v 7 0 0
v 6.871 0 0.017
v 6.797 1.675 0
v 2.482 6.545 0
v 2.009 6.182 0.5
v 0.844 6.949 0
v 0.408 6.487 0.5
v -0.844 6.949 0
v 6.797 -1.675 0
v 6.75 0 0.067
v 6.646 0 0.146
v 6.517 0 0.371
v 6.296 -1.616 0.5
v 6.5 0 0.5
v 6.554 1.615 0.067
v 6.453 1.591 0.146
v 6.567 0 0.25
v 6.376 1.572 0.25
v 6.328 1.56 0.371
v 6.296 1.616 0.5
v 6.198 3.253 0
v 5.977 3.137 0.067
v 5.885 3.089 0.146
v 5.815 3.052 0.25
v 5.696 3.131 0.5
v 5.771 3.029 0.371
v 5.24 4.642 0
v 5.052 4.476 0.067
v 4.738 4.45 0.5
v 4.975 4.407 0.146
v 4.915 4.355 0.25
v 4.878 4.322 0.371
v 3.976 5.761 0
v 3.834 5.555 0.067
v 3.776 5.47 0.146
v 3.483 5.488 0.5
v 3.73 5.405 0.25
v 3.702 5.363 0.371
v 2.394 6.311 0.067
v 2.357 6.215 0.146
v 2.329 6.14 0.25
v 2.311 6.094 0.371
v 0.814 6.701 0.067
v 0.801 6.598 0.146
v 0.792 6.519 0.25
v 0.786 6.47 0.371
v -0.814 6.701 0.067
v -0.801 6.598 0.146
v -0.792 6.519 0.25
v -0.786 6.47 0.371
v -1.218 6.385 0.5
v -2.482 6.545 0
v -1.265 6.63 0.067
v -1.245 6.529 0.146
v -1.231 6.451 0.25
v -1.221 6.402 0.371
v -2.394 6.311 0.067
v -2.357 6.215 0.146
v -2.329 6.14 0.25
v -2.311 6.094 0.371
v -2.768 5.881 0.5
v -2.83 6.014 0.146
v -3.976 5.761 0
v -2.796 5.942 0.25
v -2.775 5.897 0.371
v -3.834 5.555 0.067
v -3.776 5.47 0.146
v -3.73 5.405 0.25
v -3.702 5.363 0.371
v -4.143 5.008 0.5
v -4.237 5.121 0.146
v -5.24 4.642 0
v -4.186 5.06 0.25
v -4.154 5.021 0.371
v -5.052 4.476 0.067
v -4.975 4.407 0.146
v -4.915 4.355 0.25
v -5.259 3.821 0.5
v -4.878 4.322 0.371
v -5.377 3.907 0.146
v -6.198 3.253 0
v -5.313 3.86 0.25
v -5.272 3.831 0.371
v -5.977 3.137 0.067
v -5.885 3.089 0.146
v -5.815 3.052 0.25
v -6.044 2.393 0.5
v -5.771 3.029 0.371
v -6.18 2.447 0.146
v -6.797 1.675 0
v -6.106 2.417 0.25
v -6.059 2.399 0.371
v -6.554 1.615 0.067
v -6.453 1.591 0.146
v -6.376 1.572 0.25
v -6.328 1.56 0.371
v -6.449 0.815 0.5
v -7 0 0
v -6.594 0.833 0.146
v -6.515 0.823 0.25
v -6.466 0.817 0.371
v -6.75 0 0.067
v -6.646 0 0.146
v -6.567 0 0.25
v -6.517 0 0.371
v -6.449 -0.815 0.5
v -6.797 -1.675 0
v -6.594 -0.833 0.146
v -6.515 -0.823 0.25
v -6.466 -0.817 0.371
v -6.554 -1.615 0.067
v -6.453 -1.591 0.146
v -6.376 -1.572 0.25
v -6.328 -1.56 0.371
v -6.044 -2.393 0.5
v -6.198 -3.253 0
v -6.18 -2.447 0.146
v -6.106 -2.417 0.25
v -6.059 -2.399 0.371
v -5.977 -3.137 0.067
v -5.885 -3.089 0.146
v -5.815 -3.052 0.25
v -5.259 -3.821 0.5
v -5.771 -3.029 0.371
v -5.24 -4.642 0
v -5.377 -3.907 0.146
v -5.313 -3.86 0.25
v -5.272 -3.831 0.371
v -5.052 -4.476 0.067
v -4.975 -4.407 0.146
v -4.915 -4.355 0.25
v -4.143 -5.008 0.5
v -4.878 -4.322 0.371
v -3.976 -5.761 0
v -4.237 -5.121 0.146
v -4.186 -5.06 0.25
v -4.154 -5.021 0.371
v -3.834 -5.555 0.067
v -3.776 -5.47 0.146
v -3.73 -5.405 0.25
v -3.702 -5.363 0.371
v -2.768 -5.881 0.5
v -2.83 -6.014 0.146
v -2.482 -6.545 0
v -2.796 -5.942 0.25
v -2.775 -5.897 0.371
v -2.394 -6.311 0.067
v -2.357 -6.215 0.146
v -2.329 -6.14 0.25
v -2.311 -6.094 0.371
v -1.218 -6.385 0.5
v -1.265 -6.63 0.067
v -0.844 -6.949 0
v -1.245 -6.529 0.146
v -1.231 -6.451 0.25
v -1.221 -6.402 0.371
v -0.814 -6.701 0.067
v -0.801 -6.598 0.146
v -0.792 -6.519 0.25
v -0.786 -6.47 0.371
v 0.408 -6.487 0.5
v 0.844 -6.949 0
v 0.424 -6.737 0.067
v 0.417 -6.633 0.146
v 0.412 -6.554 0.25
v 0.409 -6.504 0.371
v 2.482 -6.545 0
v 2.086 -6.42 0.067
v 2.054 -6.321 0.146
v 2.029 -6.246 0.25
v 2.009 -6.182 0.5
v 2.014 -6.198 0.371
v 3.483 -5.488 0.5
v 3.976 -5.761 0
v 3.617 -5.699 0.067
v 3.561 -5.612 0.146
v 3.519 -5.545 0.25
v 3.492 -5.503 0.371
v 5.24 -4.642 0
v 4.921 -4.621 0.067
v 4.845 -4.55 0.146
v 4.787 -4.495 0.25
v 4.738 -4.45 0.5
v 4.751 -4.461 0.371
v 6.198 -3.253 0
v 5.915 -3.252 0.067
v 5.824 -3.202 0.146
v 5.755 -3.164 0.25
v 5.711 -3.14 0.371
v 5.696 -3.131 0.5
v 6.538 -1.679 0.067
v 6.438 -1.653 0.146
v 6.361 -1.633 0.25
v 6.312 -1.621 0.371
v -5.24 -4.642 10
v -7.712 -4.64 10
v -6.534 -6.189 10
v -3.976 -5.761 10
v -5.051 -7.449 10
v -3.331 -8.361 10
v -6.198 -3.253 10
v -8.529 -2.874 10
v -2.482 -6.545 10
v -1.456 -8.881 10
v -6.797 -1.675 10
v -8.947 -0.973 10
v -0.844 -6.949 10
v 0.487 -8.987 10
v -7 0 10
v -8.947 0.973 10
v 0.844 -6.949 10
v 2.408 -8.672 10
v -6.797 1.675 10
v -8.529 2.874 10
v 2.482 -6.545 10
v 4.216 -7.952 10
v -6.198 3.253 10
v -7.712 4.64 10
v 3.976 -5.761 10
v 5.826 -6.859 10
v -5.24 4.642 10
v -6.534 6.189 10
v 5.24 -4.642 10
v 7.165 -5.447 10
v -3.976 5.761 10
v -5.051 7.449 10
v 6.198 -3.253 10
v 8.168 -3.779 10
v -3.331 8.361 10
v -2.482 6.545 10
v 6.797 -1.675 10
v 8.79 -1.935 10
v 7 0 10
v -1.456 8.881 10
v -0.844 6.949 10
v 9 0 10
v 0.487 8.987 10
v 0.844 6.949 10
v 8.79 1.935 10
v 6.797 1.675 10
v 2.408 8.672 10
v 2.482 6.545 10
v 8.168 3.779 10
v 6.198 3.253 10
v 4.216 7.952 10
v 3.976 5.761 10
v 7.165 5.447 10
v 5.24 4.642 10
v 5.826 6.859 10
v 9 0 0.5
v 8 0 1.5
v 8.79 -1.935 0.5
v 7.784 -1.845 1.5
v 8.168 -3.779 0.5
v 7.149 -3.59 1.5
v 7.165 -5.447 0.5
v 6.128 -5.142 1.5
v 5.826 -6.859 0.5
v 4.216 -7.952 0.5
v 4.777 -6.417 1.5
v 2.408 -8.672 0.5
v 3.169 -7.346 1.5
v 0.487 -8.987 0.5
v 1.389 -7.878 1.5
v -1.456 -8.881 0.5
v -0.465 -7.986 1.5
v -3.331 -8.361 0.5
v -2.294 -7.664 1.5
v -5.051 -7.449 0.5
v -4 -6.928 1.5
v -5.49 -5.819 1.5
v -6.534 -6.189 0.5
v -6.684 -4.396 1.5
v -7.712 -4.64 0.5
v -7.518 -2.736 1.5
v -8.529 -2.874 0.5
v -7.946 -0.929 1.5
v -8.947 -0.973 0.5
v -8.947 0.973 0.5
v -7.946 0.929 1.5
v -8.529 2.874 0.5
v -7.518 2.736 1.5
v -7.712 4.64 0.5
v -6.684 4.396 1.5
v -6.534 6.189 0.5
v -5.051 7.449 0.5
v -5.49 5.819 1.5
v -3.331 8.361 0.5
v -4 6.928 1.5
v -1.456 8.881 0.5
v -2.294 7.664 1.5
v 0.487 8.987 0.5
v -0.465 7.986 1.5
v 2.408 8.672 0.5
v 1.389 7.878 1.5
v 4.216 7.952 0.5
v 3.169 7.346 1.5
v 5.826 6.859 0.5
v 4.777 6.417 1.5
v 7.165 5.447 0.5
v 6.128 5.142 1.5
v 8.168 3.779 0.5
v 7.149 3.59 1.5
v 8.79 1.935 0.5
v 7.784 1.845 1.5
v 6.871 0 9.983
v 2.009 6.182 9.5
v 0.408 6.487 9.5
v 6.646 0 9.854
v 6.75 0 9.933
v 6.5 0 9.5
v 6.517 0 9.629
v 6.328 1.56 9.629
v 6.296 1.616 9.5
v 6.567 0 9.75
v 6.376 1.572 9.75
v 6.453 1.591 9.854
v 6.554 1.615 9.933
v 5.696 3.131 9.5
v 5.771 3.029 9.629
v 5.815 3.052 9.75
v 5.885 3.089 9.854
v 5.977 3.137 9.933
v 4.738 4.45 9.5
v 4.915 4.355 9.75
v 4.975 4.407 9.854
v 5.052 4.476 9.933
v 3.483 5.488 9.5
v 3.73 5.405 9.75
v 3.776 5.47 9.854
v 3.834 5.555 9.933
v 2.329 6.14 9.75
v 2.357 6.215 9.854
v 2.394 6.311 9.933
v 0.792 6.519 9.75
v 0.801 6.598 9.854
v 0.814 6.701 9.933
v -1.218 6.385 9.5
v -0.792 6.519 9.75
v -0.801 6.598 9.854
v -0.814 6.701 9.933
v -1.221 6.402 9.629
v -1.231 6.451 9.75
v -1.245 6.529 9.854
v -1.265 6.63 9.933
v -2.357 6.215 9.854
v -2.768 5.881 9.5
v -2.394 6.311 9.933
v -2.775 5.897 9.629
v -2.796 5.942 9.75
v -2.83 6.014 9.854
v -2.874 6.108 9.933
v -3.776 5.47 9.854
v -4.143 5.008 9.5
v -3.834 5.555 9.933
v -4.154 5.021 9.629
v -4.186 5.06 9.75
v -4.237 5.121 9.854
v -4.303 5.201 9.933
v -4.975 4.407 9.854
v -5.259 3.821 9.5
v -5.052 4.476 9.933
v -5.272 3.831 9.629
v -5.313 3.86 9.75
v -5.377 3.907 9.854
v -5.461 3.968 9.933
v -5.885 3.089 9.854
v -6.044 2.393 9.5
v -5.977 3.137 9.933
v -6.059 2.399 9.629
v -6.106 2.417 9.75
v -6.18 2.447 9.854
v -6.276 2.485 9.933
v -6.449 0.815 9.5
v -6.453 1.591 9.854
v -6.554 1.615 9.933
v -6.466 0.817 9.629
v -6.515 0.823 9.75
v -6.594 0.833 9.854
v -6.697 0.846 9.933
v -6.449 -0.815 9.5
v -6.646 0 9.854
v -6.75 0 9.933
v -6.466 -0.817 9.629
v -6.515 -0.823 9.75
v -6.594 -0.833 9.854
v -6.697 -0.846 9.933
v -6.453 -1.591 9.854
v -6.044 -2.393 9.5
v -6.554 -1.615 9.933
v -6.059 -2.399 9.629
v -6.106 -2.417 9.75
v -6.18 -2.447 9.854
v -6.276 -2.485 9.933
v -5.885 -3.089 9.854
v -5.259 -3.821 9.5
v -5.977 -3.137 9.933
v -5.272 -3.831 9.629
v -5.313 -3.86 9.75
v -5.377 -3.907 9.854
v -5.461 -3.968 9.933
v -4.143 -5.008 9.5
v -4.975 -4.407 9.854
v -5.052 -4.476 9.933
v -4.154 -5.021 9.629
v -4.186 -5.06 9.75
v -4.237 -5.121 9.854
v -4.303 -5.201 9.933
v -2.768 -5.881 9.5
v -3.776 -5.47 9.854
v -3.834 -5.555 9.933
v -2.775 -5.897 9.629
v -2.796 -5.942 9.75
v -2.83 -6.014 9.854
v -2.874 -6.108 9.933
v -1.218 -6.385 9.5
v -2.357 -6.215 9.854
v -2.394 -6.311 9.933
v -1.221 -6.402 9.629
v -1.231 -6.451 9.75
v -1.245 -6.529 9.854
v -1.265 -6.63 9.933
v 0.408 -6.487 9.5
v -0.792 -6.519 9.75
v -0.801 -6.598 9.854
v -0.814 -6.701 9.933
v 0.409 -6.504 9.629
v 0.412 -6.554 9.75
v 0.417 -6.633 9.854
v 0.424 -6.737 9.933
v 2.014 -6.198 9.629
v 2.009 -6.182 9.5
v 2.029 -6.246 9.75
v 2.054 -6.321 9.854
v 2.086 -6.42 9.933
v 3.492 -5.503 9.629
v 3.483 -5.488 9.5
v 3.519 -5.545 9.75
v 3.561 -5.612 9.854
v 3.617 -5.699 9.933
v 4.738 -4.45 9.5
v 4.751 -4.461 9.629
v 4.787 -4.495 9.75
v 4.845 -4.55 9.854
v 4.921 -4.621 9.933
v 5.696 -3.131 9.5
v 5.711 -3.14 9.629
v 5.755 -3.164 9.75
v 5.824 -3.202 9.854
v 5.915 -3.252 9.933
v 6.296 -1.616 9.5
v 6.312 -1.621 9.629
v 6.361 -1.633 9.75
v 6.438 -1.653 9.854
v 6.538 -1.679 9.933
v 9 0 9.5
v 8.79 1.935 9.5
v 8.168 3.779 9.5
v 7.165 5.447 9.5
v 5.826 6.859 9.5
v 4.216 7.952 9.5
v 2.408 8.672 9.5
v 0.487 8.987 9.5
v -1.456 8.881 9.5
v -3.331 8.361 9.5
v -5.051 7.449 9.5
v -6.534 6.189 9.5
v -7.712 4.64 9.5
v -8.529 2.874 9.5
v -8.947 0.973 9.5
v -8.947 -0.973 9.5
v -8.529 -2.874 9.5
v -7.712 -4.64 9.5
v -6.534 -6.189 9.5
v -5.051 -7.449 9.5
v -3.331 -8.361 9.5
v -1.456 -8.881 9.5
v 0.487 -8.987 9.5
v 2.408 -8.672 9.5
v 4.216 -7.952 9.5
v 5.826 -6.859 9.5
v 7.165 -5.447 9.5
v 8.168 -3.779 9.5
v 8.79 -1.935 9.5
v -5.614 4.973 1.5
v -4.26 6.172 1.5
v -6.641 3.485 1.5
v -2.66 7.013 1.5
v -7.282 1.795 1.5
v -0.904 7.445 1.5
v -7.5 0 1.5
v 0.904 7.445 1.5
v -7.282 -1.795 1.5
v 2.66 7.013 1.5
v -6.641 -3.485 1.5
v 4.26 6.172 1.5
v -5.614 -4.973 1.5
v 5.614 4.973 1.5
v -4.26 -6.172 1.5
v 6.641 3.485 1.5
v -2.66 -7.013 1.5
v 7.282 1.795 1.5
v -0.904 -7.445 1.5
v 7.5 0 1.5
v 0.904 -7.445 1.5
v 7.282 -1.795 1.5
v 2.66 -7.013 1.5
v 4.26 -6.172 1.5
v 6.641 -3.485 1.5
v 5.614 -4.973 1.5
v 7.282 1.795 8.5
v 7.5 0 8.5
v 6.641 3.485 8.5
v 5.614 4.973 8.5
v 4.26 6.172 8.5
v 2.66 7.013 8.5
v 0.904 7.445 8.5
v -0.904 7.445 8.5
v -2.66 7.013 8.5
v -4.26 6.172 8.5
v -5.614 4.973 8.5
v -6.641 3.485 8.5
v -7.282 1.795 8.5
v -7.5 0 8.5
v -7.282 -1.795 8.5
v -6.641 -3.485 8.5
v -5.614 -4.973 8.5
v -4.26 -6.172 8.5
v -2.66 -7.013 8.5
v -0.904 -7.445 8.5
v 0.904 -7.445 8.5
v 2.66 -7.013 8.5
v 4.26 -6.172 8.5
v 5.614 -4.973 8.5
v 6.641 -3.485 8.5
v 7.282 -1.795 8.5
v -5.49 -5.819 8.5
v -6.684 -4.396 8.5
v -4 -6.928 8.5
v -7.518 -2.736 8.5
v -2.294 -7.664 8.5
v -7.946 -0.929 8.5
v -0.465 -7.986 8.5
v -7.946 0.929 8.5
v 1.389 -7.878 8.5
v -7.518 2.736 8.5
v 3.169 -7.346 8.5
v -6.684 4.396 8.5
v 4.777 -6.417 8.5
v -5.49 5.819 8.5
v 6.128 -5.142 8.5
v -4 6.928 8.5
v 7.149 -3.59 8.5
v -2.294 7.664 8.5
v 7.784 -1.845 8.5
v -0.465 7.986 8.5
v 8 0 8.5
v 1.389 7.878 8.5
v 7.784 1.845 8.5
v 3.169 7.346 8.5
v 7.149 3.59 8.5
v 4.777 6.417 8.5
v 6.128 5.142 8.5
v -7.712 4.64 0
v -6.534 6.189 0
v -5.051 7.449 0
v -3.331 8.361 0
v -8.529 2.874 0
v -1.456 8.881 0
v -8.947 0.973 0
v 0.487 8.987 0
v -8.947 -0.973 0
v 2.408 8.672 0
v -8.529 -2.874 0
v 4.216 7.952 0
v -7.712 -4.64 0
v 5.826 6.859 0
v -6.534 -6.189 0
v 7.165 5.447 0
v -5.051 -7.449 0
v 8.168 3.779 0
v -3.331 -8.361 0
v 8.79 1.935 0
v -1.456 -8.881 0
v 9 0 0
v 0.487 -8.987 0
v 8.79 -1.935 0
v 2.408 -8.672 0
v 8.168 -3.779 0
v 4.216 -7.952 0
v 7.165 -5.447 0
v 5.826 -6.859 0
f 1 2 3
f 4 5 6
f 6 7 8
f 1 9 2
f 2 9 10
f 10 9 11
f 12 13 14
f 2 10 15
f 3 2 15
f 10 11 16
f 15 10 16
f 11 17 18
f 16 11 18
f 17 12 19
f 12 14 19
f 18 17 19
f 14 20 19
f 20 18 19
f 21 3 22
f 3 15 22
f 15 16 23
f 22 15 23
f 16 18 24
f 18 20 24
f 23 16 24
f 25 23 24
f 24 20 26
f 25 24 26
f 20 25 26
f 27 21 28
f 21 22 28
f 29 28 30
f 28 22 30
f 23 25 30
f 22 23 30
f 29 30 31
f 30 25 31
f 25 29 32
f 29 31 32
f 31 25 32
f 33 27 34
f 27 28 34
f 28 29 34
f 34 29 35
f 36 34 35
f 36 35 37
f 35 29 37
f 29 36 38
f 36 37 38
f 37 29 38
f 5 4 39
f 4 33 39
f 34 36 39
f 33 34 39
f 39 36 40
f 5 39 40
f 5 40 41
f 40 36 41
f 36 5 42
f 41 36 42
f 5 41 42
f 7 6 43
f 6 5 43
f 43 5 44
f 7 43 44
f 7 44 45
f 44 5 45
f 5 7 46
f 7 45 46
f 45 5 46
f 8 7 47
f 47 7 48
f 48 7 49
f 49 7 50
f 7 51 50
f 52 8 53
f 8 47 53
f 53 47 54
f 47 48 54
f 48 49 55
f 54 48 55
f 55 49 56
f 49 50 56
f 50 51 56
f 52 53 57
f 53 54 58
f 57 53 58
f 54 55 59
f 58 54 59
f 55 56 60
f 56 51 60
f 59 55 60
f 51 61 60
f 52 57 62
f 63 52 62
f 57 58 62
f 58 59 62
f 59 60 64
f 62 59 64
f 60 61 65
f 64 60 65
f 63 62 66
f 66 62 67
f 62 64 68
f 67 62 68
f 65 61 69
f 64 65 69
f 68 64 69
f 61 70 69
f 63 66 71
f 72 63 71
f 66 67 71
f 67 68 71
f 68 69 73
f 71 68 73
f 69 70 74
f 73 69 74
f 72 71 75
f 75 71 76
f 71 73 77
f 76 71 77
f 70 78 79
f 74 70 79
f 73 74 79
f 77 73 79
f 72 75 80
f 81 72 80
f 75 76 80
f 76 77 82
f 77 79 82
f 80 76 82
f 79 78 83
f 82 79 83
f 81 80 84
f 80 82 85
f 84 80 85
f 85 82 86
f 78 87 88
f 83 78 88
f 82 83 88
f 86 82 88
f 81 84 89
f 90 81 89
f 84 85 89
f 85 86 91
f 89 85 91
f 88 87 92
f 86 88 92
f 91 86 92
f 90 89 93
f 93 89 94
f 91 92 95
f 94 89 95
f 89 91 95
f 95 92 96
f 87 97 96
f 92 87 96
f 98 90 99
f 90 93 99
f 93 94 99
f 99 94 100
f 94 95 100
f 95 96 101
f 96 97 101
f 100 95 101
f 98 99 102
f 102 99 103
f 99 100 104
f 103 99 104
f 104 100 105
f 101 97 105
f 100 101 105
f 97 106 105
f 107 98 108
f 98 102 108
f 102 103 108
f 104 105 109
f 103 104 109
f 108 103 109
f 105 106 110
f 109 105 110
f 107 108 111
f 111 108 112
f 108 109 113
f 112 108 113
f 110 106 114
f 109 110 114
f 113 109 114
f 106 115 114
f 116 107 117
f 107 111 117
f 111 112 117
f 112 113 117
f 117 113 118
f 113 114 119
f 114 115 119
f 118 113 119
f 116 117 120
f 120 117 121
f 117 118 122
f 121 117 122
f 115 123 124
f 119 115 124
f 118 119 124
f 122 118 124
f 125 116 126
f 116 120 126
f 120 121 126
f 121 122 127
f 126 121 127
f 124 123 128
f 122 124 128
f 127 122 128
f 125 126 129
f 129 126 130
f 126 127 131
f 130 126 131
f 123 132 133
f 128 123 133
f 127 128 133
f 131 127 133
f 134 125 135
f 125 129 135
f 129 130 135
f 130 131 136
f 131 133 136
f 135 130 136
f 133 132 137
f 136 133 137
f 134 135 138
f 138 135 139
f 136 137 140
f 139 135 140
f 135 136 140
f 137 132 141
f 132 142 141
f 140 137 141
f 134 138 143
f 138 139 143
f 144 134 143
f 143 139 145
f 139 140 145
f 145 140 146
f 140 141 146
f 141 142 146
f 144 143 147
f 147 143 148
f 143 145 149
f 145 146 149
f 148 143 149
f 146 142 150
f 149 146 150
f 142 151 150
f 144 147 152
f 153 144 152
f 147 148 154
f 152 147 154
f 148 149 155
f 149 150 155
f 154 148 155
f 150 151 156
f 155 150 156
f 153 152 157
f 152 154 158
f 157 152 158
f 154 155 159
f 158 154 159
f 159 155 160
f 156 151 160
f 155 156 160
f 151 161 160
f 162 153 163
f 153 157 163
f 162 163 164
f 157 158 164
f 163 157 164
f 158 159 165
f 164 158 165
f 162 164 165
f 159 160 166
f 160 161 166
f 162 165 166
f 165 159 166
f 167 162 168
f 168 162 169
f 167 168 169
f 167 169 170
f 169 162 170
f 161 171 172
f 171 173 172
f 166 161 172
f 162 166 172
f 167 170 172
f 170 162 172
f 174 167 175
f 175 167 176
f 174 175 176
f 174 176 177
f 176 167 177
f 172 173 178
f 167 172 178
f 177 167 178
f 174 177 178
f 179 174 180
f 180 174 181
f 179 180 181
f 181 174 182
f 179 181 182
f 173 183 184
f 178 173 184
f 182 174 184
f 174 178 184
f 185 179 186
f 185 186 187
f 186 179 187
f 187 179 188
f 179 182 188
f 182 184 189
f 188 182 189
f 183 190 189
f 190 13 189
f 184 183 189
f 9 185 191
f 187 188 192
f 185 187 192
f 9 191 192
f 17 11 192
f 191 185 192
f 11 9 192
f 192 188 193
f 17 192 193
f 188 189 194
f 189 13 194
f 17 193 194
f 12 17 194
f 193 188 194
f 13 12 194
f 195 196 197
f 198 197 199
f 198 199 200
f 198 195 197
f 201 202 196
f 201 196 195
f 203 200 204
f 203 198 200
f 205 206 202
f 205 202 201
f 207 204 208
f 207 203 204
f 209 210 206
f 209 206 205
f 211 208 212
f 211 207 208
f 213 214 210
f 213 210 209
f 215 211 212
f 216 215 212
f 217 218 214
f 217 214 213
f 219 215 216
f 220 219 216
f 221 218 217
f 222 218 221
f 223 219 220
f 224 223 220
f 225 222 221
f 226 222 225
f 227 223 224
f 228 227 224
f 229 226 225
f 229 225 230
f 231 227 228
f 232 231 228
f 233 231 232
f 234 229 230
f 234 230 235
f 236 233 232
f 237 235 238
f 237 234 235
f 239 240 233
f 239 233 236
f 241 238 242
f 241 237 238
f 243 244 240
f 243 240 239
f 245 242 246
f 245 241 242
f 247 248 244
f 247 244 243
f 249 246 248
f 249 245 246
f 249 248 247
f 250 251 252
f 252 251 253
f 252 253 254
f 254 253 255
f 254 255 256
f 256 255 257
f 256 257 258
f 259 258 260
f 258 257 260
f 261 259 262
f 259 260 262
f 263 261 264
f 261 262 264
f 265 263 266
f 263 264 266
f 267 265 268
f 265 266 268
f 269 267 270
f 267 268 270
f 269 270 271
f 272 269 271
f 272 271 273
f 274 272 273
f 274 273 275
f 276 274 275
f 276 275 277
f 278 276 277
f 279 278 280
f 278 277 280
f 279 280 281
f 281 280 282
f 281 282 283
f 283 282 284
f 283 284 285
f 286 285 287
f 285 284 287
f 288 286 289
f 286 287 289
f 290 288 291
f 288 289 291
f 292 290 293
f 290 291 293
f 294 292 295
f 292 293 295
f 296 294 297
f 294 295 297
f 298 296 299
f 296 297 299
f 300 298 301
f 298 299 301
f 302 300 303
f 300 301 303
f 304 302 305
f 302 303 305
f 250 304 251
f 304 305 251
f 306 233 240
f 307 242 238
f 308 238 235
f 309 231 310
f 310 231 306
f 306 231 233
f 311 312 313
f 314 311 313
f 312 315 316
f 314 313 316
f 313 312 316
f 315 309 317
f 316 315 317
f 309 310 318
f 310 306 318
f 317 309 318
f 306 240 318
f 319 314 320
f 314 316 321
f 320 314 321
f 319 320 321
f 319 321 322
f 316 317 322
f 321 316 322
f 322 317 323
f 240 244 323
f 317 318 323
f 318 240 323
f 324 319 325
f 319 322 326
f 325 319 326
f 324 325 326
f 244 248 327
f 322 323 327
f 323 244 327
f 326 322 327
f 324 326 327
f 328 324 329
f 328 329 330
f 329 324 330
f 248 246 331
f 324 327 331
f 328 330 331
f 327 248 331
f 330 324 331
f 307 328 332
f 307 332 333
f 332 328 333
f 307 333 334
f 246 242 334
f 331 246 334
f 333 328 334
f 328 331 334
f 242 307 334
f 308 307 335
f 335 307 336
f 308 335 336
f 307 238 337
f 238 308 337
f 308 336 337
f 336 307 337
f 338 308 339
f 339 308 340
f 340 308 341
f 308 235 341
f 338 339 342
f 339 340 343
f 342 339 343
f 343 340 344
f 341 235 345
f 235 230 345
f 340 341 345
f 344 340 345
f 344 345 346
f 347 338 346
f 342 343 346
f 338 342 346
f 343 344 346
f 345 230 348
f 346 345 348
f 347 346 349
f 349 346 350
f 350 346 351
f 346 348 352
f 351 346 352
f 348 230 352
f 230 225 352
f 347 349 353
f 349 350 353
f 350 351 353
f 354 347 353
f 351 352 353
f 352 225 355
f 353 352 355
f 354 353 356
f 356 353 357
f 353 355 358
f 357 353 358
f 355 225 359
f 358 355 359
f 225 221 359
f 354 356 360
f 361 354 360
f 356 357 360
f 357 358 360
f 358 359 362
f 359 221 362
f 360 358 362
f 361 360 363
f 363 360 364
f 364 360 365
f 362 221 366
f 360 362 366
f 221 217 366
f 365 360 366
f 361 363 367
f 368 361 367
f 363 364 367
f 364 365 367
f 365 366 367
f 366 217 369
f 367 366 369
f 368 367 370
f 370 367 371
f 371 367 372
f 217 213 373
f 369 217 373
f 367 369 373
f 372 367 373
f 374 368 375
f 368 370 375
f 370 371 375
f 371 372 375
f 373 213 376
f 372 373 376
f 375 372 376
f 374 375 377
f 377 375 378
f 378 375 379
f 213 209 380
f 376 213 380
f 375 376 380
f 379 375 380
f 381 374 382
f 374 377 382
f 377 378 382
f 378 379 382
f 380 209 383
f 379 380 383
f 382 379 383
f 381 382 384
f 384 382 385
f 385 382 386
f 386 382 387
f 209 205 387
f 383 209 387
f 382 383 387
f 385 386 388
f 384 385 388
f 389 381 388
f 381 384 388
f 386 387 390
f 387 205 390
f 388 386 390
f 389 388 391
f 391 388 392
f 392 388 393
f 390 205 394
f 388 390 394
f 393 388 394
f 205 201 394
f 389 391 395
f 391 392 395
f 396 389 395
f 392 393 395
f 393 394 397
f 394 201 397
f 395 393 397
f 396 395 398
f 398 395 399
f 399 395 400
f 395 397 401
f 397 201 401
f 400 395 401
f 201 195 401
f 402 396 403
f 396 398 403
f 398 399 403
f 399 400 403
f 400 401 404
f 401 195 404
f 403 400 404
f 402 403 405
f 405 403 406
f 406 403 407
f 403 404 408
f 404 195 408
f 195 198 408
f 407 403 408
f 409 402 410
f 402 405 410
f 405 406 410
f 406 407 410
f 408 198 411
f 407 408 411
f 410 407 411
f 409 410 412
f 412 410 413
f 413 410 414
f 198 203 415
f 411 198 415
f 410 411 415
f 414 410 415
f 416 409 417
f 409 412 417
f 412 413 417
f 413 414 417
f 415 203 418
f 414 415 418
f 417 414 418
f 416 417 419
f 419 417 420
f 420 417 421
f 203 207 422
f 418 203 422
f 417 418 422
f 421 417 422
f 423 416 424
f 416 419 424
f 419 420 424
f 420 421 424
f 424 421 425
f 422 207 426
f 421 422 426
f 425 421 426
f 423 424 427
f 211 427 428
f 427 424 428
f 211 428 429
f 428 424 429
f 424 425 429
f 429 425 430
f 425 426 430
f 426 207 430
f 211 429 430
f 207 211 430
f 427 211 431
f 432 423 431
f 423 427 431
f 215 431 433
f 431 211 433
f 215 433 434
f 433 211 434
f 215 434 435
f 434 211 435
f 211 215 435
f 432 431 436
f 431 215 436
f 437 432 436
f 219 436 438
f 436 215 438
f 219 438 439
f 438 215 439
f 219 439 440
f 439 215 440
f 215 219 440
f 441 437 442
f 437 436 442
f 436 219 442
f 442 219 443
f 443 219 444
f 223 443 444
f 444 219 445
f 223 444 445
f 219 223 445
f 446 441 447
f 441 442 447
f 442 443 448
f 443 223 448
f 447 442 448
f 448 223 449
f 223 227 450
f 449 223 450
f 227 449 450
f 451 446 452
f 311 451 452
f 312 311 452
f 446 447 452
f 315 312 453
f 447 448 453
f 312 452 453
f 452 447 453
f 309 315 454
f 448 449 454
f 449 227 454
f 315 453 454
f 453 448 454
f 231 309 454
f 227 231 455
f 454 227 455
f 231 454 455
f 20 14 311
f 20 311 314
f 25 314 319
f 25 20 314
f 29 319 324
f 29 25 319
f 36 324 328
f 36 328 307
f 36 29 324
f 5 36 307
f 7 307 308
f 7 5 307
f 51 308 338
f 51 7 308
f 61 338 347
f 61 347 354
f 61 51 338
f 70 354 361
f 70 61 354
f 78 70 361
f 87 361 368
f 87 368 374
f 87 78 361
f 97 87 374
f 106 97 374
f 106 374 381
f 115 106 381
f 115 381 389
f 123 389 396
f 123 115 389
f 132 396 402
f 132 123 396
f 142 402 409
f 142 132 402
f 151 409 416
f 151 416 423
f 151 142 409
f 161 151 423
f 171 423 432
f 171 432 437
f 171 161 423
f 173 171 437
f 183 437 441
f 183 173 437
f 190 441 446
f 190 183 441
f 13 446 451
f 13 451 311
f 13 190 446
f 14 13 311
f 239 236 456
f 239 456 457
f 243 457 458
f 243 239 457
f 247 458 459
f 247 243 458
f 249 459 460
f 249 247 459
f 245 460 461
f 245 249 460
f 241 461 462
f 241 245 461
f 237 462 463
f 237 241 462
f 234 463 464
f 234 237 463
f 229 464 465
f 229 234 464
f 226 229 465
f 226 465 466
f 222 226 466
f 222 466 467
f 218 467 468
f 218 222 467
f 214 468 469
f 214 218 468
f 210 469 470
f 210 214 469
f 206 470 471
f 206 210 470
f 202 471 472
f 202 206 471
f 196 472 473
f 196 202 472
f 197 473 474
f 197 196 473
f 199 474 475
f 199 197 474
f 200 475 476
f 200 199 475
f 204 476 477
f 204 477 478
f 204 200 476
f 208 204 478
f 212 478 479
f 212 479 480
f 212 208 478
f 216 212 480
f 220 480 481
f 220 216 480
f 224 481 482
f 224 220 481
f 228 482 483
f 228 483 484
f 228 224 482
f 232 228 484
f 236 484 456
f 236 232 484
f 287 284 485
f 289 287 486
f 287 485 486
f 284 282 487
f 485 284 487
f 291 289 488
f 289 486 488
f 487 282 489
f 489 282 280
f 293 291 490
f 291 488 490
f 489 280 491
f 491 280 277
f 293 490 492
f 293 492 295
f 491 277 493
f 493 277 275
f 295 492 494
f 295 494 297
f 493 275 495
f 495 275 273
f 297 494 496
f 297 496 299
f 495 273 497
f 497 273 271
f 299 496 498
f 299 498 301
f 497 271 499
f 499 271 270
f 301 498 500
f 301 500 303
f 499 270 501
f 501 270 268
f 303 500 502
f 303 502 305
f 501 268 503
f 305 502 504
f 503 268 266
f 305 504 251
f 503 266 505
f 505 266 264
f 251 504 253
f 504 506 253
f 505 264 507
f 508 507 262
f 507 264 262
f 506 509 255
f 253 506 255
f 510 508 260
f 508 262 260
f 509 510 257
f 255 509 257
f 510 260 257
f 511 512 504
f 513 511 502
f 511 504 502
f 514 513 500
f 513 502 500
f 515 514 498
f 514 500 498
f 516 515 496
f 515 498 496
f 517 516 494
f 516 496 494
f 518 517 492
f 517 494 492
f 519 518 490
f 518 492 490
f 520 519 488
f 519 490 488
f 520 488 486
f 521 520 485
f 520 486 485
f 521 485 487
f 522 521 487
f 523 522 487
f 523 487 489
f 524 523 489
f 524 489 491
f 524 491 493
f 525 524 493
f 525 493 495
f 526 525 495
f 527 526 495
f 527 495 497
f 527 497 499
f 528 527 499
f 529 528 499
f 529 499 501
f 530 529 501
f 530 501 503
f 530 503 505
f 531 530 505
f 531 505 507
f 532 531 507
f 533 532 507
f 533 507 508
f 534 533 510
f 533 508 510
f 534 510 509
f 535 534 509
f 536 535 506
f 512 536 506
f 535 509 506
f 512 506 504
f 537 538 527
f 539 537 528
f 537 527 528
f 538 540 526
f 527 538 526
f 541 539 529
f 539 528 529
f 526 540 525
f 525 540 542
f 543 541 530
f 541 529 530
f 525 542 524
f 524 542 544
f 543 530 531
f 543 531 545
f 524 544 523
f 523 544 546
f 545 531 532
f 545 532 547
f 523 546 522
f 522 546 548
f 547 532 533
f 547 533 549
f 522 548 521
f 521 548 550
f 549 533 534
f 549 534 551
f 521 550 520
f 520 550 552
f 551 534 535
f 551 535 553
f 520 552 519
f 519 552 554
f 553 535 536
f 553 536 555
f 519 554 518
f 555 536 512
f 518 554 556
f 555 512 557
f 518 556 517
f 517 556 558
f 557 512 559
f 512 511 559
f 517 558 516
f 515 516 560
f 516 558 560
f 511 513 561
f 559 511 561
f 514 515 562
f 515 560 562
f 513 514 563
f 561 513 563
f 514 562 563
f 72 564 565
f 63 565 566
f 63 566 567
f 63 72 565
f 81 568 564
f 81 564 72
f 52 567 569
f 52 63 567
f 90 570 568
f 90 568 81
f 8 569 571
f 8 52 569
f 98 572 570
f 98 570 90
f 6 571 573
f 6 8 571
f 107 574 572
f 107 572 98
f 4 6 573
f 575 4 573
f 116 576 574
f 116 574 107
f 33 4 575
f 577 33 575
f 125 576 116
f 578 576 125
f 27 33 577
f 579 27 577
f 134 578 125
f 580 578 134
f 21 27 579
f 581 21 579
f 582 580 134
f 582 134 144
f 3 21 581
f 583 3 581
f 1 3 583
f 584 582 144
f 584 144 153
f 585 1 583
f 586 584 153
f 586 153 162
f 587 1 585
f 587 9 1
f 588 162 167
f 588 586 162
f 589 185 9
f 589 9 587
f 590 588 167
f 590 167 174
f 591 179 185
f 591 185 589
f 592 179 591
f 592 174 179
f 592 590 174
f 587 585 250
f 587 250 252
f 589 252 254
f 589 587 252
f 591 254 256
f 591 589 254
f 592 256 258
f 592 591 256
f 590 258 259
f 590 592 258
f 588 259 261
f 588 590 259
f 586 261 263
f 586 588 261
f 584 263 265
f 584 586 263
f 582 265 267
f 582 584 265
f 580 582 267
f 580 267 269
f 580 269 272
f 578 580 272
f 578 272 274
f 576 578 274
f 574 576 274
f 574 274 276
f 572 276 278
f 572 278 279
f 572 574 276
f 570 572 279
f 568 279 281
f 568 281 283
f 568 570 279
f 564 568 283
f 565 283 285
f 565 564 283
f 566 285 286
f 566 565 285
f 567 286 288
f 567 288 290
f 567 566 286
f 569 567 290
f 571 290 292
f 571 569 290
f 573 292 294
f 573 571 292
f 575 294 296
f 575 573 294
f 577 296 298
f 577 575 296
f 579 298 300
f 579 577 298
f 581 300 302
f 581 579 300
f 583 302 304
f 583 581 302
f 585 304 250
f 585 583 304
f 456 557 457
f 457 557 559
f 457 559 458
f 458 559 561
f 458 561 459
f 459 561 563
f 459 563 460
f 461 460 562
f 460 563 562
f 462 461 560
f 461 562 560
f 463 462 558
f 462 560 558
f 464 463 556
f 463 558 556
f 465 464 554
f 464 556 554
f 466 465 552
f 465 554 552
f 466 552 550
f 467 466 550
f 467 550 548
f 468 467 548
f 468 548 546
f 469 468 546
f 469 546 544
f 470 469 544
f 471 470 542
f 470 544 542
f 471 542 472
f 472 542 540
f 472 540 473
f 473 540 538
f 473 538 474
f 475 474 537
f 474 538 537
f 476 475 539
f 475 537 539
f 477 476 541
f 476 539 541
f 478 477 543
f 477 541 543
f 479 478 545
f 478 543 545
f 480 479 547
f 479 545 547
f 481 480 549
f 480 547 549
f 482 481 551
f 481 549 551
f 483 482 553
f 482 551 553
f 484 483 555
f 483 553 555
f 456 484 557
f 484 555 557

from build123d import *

# Parameters (mm, degrees)
F0_R      = 7.5
F0_R_2    = 6.5
F1_DEPTH  = 10
F2_R      = 9
F2_R_2    = 7.5
F3_DEPTH  = 1.5
F4_SIZE   = 1
F5_R      = 9
F5_R_2    = 7.5
F6_DEPTH  = 1.5
F7_SIZE   = 1
F6_FACE_R = 6.5
F8_DEPTH  = 25
F9_R      = 0.5
F10_R     = 0.5


with BuildPart() as f1:
    # F0 (on Top) → F1 (new body)
    with BuildSketch(Plane.XY):
        Circle(F0_R)
        Circle(F0_R_2, mode=Mode.SUBTRACT)
    extrude(amount=F1_DEPTH)

    # F2 (on face) → F3 (join)
    with BuildSketch(Plane.XY.offset(10)):
        Circle(F2_R)
        Circle(F2_R_2, mode=Mode.SUBTRACT)
    extrude(amount=-F3_DEPTH)

    # F4
    f4_edges = [f1.edges().sort_by_distance(p)[0] for p in [
        (-9, 0, 8.5),
    ]]
    chamfer(f4_edges, length=F4_SIZE)

    # F5 (on face) → F6 (join)
    with BuildSketch(Plane(origin=(0, 0, 0), x_dir=(1, 0, 0), z_dir=(0, 0, -1))):
        Circle(F5_R)
        Circle(F5_R)
        Circle(F5_R_2, mode=Mode.SUBTRACT)
    extrude(amount=-F6_DEPTH)

    # F7
    f7_edges = [f1.edges().sort_by_distance(p)[0] for p in [
        (-9, 0, 1.5),
    ]]
    chamfer(f7_edges, length=F7_SIZE)

    # F6_face (on face) → F8 (cut)
    with BuildSketch(Plane.XY.offset(1.5)):
        Circle(F6_FACE_R)
    extrude(amount=-F8_DEPTH, mode=Mode.SUBTRACT)

    # F9
    f9_edges = [f1.edges().sort_by_distance(p)[0] for p in [
        (-6.5, 0, 0),
    ]]
    fillet(f9_edges, radius=F9_R)

    # F10
    f10_edges = [f1.edges().sort_by_distance(p)[0] for p in [
        (-6.5, 0, 10),
    ]]
    fillet(f10_edges, radius=F10_R)


solid = f1.part
